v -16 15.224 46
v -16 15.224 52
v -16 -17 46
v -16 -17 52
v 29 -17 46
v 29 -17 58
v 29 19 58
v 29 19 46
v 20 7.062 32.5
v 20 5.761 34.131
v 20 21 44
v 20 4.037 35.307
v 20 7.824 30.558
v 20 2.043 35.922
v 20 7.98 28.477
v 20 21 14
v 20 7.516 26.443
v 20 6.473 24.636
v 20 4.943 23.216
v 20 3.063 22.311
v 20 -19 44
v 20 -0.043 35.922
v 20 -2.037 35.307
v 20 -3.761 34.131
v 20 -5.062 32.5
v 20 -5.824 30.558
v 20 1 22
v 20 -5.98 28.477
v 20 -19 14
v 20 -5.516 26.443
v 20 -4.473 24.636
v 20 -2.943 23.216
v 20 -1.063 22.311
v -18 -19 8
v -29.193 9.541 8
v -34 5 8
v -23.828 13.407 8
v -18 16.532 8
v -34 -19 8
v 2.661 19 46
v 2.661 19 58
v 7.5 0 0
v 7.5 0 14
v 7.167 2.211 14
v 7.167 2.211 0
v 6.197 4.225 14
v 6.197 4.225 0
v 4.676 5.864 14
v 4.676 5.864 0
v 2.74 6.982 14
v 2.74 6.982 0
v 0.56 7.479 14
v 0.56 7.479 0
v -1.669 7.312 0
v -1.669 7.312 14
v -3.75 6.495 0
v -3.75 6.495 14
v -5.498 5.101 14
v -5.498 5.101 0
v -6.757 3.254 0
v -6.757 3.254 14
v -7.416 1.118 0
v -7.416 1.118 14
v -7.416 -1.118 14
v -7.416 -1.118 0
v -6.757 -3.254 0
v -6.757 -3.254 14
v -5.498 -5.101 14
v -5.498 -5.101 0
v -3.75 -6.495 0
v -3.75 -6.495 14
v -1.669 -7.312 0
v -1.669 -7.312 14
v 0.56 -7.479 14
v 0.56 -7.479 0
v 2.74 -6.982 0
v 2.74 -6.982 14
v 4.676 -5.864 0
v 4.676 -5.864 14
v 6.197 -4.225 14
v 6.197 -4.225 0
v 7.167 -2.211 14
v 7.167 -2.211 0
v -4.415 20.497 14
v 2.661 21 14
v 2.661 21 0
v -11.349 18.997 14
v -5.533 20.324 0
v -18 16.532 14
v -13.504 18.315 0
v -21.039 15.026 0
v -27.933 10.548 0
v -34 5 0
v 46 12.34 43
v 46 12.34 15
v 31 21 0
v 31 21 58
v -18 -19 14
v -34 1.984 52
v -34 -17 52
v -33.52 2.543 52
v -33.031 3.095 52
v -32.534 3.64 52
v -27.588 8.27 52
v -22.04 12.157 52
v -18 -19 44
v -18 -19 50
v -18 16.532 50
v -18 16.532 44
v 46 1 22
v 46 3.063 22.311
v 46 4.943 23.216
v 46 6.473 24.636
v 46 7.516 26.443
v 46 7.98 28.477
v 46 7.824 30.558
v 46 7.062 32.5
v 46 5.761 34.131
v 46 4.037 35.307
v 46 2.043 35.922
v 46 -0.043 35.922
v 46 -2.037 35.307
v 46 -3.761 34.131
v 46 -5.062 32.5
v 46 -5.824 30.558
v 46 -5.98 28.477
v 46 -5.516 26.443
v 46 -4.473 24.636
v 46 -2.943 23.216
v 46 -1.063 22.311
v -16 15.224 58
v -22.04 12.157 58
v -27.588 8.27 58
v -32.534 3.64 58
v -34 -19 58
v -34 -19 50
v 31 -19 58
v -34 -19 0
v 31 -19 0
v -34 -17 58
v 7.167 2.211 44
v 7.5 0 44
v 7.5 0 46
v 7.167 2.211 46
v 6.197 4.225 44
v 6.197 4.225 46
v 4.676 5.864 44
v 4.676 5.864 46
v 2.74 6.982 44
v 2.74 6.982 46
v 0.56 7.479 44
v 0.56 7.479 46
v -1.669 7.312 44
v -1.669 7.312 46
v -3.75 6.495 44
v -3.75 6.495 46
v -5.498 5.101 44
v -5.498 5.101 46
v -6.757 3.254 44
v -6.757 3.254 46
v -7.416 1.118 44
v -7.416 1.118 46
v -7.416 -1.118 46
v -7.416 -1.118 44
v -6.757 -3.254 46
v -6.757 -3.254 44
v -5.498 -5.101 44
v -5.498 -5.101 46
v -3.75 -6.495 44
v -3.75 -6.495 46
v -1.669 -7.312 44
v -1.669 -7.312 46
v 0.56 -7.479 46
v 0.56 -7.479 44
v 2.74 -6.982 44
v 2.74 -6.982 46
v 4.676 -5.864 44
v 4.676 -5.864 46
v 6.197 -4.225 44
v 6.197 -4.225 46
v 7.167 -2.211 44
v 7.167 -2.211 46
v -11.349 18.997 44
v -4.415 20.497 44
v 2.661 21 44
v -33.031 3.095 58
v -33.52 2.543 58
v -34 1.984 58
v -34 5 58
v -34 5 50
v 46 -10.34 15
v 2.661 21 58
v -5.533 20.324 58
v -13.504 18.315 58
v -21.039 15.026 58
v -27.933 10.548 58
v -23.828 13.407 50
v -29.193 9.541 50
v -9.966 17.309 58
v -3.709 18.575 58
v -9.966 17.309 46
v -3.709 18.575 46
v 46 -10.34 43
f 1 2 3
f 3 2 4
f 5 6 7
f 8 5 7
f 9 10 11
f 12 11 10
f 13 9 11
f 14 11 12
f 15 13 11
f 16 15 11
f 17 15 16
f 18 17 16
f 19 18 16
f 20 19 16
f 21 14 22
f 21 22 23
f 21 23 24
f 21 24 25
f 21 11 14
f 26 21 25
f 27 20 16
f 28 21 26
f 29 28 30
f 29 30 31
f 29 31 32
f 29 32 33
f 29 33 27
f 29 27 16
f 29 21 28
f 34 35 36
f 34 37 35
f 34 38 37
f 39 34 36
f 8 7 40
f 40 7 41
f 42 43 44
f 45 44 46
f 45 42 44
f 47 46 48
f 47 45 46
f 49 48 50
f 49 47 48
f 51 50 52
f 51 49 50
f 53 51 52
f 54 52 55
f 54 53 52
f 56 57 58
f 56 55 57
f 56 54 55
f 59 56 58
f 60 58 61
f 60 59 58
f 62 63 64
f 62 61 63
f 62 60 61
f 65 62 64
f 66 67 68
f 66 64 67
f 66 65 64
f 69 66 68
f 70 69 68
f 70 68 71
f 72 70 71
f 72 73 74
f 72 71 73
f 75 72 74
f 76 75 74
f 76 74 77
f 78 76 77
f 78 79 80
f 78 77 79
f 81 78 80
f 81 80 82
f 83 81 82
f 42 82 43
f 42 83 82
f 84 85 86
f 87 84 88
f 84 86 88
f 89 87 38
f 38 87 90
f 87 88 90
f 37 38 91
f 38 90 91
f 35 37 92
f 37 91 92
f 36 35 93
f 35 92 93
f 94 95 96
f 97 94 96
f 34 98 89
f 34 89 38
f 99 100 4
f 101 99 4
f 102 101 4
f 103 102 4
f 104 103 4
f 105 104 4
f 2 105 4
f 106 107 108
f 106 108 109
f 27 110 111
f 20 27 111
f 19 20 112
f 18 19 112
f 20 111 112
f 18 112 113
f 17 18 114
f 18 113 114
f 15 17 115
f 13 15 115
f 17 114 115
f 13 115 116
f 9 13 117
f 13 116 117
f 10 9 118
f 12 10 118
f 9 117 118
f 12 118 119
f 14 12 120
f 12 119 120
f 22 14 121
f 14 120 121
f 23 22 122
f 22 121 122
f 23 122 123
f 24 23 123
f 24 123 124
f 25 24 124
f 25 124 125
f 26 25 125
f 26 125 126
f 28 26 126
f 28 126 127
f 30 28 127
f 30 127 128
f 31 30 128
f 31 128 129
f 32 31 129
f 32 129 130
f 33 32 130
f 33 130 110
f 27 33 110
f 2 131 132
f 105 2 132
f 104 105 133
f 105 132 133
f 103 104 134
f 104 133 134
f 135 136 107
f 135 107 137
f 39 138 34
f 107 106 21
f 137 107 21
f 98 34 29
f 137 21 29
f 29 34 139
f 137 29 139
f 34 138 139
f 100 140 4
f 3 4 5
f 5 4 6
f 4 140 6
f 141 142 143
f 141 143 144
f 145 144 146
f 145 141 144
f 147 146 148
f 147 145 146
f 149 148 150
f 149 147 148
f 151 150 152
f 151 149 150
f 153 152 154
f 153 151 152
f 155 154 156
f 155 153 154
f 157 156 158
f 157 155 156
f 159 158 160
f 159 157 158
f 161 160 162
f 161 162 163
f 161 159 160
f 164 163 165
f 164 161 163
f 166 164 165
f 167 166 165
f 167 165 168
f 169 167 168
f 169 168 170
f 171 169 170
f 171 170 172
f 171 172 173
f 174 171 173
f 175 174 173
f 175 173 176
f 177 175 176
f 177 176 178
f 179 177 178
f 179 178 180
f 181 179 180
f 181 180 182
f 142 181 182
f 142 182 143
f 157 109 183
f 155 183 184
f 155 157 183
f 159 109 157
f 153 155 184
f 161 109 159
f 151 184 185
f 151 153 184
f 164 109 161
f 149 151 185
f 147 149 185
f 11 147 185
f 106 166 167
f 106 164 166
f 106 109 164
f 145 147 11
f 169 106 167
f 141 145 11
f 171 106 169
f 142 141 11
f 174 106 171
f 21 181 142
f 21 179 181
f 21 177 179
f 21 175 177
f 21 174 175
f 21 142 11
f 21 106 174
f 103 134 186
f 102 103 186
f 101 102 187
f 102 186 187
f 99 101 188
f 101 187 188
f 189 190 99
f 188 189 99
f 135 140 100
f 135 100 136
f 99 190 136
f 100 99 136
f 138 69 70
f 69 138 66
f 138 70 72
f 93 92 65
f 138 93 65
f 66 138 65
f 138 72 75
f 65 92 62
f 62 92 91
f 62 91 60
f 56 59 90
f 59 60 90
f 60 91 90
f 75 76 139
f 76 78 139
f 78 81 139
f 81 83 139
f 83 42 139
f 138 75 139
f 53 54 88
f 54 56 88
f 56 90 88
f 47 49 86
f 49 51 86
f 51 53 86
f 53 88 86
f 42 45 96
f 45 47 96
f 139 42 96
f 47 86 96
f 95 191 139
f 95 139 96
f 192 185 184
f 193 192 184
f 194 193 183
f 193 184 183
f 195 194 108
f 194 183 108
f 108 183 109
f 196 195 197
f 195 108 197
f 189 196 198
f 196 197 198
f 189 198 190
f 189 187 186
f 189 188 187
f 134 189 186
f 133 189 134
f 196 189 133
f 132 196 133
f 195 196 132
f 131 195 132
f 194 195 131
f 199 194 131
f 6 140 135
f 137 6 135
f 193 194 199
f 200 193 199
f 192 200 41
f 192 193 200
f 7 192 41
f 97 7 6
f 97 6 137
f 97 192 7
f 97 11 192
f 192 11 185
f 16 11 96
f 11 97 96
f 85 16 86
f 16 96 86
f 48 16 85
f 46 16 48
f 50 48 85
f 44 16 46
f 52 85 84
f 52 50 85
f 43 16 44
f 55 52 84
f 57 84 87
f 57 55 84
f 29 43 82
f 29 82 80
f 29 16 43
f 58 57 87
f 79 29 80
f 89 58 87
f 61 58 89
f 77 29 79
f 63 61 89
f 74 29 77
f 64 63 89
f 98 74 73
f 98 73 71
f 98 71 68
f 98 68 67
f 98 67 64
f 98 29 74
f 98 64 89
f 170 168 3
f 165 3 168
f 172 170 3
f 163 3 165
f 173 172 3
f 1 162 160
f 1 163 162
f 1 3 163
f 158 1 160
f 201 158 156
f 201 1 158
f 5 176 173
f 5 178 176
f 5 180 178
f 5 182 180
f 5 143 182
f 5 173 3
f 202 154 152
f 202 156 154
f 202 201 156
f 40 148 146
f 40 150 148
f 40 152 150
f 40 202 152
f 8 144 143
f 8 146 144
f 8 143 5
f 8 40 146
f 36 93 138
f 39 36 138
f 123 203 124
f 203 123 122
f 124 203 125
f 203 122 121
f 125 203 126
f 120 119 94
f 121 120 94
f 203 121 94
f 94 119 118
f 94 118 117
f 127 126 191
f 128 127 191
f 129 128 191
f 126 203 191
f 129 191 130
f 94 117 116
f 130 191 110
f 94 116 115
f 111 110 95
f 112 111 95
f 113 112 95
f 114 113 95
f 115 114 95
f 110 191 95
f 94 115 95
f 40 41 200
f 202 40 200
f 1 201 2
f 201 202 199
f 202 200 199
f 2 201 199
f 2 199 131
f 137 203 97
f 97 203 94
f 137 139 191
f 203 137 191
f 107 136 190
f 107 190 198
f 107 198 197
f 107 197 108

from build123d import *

# Parameters (mm, degrees)
SKETCH1_R           = 7.5
BOSS_EXTRUDE1_DEPTH = 58
CUT_EXTRUDE1_REACH  = 86.143
CUT_EXTRUDE2_REACH  = 103.02
SKETCH3_R           = 7
CHAMFER1_SIZE       = 15
CUT_EXTRUDE3_DEPTH  = 6
CUT_EXTRUDE4_START  = -12
SKETCH4_3_R         = 7.5
CUT_EXTRUDE4_DEPTH  = 12


with BuildPart() as part:
    # Sketch1 → Boss-Extrude1 (new body)
    with BuildSketch(Plane.XY):
        with BuildLine():
            Line((-34, -19), (31, -19))
            Line((31, -19), (46, -10.339745962))
            Line((46, -10.339745962), (46, 12.339745962))
            Line((46, 12.339745962), (31, 21))
            Line((31, 21), (2.66060556, 21))
            ThreePointArc((2.66060556, 21), (-17.33939444, 16.82575695), (-34, 5))
            Line((-34, 5), (-34, -19))
        make_face()
        Circle(SKETCH1_R, mode=Mode.SUBTRACT)
    extrude(amount=BOSS_EXTRUDE1_DEPTH)

    # Sketch2 → Cut-Extrude1 (cut, up to next)
    with BuildSketch(Plane.XZ.offset(19), mode=Mode.PRIVATE) as cut_extrude1_sk1:
        Polygon((-34, 50), (-18, 50), (-18, 44), (20, 44), (20, 14), (-18, 14), (-18, 8), (-34, 8), align=None)
    cut_extrude1_tool1 = extrude(cut_extrude1_sk1.sketch, amount=-CUT_EXTRUDE1_REACH, mode=Mode.PRIVATE) & part.part
    add(cut_extrude1_tool1.solids().sort_by_distance((-9.013245, -19, 29))[0], mode=Mode.SUBTRACT)

    # Sketch3 → Cut-Extrude2 (cut, up to next)
    with BuildSketch(Plane(origin=(46, 0, 0), x_dir=(0, 0, -1), z_dir=(1, 0, 0)), mode=Mode.PRIVATE) as cut_extrude2_sk1:
        with Locations((-29, 1)):
            Circle(SKETCH3_R)
    cut_extrude2_tool1 = extrude(cut_extrude2_sk1.sketch, amount=-CUT_EXTRUDE2_REACH, mode=Mode.PRIVATE) & part.part
    add(cut_extrude2_tool1.solids().sort_by_distance((46, 1, 29))[0], mode=Mode.SUBTRACT)

    # Chamfer1
    chamfer1_edges = [part.edges().sort_by_distance(p)[0] for p in [
        (46, 1, 0),
        (46, 1, 58),
    ]]
    chamfer(chamfer1_edges, length=CHAMFER1_SIZE)

    # Sketch4 → Cut-Extrude3 (cut)
    with BuildSketch(Plane.XY.offset(58)):
        with BuildLine():
            ThreePointArc((-32.533575778, 3.64), (-33.2763294, 2.820381922), (-34, 1.98386677))
            Line((-34, 1.98386677), (-34, -17))
            Line((-34, -17), (-16, -17))
            Line((-16, -17), (-16, 15.224221872))
            ThreePointArc((-16, 15.224221872), (-24.882688852, 10.311155325), (-32.533575778, 3.64))
        make_face()
    extrude(amount=-CUT_EXTRUDE3_DEPTH, mode=Mode.SUBTRACT)

    # Sketch4<3> → Cut-Extrude4 (cut)
    with BuildSketch(Plane.XY.offset(58).offset(CUT_EXTRUDE4_START)):
        with BuildLine():
            Line((-16, 15.224221872), (-16, -17))
            Line((-16, -17), (29, -17))
            Line((29, -17), (29, 19))
            Line((29, 19), (2.66060556, 19))
            ThreePointArc((2.66060556, 19), (-6.858778616, 18.046586751), (-16, 15.224221872))
        make_face()
        Circle(SKETCH4_3_R, mode=Mode.SUBTRACT)
    extrude(amount=CUT_EXTRUDE4_DEPTH, mode=Mode.SUBTRACT)


solid = part.part
